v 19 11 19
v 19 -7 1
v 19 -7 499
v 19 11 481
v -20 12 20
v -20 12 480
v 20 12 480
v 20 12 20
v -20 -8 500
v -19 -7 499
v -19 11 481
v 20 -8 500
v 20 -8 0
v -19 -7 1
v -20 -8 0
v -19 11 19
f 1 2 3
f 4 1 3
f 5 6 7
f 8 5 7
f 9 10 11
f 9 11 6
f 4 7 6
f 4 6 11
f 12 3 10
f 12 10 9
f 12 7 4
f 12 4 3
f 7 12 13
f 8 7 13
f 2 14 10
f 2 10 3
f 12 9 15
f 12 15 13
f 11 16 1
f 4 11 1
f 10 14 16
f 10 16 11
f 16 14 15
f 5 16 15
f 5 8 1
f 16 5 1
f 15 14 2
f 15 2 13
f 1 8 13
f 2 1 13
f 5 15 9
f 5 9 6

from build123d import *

# Parameters (mm, degrees)
SKETCH1_W           = 40
SKETCH1_H           = 20
BOSS_EXTRUDE1_DEPTH = 500
SKETCH3_W           = 38
SKETCH3_H           = 18
CUT_EXTRUDE1_DEPTH  = 501
CUT_EXTRUDE2_DEPTH  = 41


with BuildPart() as part:
    # Sketch1 → Boss-Extrude1 (new body)
    with BuildSketch(Plane.XY):
        with Locations((0, 2)):
            Rectangle(SKETCH1_W, SKETCH1_H)
    extrude(amount=BOSS_EXTRUDE1_DEPTH)

    # Sketch3 → Cut-Extrude1 (cut, through all)
    with BuildSketch(Plane.XY.offset(500)):
        with Locations((0, 2)):
            Rectangle(SKETCH3_W, SKETCH3_H)
    extrude(amount=-CUT_EXTRUDE1_DEPTH, mode=Mode.SUBTRACT)

    # Sketch4 → Cut-Extrude2 (cut, through all)
    with BuildSketch(Plane(origin=(20, 0, 0), x_dir=(0, 0, -1), z_dir=(1, 0, 0))):
        Polygon((-500, 12), (-480, 12), (-500, -8), align=None)
        Polygon((0, 12), (-20, 12), (0, -8), align=None)
    extrude(amount=-CUT_EXTRUDE2_DEPTH, mode=Mode.SUBTRACT)


solid = part.part
